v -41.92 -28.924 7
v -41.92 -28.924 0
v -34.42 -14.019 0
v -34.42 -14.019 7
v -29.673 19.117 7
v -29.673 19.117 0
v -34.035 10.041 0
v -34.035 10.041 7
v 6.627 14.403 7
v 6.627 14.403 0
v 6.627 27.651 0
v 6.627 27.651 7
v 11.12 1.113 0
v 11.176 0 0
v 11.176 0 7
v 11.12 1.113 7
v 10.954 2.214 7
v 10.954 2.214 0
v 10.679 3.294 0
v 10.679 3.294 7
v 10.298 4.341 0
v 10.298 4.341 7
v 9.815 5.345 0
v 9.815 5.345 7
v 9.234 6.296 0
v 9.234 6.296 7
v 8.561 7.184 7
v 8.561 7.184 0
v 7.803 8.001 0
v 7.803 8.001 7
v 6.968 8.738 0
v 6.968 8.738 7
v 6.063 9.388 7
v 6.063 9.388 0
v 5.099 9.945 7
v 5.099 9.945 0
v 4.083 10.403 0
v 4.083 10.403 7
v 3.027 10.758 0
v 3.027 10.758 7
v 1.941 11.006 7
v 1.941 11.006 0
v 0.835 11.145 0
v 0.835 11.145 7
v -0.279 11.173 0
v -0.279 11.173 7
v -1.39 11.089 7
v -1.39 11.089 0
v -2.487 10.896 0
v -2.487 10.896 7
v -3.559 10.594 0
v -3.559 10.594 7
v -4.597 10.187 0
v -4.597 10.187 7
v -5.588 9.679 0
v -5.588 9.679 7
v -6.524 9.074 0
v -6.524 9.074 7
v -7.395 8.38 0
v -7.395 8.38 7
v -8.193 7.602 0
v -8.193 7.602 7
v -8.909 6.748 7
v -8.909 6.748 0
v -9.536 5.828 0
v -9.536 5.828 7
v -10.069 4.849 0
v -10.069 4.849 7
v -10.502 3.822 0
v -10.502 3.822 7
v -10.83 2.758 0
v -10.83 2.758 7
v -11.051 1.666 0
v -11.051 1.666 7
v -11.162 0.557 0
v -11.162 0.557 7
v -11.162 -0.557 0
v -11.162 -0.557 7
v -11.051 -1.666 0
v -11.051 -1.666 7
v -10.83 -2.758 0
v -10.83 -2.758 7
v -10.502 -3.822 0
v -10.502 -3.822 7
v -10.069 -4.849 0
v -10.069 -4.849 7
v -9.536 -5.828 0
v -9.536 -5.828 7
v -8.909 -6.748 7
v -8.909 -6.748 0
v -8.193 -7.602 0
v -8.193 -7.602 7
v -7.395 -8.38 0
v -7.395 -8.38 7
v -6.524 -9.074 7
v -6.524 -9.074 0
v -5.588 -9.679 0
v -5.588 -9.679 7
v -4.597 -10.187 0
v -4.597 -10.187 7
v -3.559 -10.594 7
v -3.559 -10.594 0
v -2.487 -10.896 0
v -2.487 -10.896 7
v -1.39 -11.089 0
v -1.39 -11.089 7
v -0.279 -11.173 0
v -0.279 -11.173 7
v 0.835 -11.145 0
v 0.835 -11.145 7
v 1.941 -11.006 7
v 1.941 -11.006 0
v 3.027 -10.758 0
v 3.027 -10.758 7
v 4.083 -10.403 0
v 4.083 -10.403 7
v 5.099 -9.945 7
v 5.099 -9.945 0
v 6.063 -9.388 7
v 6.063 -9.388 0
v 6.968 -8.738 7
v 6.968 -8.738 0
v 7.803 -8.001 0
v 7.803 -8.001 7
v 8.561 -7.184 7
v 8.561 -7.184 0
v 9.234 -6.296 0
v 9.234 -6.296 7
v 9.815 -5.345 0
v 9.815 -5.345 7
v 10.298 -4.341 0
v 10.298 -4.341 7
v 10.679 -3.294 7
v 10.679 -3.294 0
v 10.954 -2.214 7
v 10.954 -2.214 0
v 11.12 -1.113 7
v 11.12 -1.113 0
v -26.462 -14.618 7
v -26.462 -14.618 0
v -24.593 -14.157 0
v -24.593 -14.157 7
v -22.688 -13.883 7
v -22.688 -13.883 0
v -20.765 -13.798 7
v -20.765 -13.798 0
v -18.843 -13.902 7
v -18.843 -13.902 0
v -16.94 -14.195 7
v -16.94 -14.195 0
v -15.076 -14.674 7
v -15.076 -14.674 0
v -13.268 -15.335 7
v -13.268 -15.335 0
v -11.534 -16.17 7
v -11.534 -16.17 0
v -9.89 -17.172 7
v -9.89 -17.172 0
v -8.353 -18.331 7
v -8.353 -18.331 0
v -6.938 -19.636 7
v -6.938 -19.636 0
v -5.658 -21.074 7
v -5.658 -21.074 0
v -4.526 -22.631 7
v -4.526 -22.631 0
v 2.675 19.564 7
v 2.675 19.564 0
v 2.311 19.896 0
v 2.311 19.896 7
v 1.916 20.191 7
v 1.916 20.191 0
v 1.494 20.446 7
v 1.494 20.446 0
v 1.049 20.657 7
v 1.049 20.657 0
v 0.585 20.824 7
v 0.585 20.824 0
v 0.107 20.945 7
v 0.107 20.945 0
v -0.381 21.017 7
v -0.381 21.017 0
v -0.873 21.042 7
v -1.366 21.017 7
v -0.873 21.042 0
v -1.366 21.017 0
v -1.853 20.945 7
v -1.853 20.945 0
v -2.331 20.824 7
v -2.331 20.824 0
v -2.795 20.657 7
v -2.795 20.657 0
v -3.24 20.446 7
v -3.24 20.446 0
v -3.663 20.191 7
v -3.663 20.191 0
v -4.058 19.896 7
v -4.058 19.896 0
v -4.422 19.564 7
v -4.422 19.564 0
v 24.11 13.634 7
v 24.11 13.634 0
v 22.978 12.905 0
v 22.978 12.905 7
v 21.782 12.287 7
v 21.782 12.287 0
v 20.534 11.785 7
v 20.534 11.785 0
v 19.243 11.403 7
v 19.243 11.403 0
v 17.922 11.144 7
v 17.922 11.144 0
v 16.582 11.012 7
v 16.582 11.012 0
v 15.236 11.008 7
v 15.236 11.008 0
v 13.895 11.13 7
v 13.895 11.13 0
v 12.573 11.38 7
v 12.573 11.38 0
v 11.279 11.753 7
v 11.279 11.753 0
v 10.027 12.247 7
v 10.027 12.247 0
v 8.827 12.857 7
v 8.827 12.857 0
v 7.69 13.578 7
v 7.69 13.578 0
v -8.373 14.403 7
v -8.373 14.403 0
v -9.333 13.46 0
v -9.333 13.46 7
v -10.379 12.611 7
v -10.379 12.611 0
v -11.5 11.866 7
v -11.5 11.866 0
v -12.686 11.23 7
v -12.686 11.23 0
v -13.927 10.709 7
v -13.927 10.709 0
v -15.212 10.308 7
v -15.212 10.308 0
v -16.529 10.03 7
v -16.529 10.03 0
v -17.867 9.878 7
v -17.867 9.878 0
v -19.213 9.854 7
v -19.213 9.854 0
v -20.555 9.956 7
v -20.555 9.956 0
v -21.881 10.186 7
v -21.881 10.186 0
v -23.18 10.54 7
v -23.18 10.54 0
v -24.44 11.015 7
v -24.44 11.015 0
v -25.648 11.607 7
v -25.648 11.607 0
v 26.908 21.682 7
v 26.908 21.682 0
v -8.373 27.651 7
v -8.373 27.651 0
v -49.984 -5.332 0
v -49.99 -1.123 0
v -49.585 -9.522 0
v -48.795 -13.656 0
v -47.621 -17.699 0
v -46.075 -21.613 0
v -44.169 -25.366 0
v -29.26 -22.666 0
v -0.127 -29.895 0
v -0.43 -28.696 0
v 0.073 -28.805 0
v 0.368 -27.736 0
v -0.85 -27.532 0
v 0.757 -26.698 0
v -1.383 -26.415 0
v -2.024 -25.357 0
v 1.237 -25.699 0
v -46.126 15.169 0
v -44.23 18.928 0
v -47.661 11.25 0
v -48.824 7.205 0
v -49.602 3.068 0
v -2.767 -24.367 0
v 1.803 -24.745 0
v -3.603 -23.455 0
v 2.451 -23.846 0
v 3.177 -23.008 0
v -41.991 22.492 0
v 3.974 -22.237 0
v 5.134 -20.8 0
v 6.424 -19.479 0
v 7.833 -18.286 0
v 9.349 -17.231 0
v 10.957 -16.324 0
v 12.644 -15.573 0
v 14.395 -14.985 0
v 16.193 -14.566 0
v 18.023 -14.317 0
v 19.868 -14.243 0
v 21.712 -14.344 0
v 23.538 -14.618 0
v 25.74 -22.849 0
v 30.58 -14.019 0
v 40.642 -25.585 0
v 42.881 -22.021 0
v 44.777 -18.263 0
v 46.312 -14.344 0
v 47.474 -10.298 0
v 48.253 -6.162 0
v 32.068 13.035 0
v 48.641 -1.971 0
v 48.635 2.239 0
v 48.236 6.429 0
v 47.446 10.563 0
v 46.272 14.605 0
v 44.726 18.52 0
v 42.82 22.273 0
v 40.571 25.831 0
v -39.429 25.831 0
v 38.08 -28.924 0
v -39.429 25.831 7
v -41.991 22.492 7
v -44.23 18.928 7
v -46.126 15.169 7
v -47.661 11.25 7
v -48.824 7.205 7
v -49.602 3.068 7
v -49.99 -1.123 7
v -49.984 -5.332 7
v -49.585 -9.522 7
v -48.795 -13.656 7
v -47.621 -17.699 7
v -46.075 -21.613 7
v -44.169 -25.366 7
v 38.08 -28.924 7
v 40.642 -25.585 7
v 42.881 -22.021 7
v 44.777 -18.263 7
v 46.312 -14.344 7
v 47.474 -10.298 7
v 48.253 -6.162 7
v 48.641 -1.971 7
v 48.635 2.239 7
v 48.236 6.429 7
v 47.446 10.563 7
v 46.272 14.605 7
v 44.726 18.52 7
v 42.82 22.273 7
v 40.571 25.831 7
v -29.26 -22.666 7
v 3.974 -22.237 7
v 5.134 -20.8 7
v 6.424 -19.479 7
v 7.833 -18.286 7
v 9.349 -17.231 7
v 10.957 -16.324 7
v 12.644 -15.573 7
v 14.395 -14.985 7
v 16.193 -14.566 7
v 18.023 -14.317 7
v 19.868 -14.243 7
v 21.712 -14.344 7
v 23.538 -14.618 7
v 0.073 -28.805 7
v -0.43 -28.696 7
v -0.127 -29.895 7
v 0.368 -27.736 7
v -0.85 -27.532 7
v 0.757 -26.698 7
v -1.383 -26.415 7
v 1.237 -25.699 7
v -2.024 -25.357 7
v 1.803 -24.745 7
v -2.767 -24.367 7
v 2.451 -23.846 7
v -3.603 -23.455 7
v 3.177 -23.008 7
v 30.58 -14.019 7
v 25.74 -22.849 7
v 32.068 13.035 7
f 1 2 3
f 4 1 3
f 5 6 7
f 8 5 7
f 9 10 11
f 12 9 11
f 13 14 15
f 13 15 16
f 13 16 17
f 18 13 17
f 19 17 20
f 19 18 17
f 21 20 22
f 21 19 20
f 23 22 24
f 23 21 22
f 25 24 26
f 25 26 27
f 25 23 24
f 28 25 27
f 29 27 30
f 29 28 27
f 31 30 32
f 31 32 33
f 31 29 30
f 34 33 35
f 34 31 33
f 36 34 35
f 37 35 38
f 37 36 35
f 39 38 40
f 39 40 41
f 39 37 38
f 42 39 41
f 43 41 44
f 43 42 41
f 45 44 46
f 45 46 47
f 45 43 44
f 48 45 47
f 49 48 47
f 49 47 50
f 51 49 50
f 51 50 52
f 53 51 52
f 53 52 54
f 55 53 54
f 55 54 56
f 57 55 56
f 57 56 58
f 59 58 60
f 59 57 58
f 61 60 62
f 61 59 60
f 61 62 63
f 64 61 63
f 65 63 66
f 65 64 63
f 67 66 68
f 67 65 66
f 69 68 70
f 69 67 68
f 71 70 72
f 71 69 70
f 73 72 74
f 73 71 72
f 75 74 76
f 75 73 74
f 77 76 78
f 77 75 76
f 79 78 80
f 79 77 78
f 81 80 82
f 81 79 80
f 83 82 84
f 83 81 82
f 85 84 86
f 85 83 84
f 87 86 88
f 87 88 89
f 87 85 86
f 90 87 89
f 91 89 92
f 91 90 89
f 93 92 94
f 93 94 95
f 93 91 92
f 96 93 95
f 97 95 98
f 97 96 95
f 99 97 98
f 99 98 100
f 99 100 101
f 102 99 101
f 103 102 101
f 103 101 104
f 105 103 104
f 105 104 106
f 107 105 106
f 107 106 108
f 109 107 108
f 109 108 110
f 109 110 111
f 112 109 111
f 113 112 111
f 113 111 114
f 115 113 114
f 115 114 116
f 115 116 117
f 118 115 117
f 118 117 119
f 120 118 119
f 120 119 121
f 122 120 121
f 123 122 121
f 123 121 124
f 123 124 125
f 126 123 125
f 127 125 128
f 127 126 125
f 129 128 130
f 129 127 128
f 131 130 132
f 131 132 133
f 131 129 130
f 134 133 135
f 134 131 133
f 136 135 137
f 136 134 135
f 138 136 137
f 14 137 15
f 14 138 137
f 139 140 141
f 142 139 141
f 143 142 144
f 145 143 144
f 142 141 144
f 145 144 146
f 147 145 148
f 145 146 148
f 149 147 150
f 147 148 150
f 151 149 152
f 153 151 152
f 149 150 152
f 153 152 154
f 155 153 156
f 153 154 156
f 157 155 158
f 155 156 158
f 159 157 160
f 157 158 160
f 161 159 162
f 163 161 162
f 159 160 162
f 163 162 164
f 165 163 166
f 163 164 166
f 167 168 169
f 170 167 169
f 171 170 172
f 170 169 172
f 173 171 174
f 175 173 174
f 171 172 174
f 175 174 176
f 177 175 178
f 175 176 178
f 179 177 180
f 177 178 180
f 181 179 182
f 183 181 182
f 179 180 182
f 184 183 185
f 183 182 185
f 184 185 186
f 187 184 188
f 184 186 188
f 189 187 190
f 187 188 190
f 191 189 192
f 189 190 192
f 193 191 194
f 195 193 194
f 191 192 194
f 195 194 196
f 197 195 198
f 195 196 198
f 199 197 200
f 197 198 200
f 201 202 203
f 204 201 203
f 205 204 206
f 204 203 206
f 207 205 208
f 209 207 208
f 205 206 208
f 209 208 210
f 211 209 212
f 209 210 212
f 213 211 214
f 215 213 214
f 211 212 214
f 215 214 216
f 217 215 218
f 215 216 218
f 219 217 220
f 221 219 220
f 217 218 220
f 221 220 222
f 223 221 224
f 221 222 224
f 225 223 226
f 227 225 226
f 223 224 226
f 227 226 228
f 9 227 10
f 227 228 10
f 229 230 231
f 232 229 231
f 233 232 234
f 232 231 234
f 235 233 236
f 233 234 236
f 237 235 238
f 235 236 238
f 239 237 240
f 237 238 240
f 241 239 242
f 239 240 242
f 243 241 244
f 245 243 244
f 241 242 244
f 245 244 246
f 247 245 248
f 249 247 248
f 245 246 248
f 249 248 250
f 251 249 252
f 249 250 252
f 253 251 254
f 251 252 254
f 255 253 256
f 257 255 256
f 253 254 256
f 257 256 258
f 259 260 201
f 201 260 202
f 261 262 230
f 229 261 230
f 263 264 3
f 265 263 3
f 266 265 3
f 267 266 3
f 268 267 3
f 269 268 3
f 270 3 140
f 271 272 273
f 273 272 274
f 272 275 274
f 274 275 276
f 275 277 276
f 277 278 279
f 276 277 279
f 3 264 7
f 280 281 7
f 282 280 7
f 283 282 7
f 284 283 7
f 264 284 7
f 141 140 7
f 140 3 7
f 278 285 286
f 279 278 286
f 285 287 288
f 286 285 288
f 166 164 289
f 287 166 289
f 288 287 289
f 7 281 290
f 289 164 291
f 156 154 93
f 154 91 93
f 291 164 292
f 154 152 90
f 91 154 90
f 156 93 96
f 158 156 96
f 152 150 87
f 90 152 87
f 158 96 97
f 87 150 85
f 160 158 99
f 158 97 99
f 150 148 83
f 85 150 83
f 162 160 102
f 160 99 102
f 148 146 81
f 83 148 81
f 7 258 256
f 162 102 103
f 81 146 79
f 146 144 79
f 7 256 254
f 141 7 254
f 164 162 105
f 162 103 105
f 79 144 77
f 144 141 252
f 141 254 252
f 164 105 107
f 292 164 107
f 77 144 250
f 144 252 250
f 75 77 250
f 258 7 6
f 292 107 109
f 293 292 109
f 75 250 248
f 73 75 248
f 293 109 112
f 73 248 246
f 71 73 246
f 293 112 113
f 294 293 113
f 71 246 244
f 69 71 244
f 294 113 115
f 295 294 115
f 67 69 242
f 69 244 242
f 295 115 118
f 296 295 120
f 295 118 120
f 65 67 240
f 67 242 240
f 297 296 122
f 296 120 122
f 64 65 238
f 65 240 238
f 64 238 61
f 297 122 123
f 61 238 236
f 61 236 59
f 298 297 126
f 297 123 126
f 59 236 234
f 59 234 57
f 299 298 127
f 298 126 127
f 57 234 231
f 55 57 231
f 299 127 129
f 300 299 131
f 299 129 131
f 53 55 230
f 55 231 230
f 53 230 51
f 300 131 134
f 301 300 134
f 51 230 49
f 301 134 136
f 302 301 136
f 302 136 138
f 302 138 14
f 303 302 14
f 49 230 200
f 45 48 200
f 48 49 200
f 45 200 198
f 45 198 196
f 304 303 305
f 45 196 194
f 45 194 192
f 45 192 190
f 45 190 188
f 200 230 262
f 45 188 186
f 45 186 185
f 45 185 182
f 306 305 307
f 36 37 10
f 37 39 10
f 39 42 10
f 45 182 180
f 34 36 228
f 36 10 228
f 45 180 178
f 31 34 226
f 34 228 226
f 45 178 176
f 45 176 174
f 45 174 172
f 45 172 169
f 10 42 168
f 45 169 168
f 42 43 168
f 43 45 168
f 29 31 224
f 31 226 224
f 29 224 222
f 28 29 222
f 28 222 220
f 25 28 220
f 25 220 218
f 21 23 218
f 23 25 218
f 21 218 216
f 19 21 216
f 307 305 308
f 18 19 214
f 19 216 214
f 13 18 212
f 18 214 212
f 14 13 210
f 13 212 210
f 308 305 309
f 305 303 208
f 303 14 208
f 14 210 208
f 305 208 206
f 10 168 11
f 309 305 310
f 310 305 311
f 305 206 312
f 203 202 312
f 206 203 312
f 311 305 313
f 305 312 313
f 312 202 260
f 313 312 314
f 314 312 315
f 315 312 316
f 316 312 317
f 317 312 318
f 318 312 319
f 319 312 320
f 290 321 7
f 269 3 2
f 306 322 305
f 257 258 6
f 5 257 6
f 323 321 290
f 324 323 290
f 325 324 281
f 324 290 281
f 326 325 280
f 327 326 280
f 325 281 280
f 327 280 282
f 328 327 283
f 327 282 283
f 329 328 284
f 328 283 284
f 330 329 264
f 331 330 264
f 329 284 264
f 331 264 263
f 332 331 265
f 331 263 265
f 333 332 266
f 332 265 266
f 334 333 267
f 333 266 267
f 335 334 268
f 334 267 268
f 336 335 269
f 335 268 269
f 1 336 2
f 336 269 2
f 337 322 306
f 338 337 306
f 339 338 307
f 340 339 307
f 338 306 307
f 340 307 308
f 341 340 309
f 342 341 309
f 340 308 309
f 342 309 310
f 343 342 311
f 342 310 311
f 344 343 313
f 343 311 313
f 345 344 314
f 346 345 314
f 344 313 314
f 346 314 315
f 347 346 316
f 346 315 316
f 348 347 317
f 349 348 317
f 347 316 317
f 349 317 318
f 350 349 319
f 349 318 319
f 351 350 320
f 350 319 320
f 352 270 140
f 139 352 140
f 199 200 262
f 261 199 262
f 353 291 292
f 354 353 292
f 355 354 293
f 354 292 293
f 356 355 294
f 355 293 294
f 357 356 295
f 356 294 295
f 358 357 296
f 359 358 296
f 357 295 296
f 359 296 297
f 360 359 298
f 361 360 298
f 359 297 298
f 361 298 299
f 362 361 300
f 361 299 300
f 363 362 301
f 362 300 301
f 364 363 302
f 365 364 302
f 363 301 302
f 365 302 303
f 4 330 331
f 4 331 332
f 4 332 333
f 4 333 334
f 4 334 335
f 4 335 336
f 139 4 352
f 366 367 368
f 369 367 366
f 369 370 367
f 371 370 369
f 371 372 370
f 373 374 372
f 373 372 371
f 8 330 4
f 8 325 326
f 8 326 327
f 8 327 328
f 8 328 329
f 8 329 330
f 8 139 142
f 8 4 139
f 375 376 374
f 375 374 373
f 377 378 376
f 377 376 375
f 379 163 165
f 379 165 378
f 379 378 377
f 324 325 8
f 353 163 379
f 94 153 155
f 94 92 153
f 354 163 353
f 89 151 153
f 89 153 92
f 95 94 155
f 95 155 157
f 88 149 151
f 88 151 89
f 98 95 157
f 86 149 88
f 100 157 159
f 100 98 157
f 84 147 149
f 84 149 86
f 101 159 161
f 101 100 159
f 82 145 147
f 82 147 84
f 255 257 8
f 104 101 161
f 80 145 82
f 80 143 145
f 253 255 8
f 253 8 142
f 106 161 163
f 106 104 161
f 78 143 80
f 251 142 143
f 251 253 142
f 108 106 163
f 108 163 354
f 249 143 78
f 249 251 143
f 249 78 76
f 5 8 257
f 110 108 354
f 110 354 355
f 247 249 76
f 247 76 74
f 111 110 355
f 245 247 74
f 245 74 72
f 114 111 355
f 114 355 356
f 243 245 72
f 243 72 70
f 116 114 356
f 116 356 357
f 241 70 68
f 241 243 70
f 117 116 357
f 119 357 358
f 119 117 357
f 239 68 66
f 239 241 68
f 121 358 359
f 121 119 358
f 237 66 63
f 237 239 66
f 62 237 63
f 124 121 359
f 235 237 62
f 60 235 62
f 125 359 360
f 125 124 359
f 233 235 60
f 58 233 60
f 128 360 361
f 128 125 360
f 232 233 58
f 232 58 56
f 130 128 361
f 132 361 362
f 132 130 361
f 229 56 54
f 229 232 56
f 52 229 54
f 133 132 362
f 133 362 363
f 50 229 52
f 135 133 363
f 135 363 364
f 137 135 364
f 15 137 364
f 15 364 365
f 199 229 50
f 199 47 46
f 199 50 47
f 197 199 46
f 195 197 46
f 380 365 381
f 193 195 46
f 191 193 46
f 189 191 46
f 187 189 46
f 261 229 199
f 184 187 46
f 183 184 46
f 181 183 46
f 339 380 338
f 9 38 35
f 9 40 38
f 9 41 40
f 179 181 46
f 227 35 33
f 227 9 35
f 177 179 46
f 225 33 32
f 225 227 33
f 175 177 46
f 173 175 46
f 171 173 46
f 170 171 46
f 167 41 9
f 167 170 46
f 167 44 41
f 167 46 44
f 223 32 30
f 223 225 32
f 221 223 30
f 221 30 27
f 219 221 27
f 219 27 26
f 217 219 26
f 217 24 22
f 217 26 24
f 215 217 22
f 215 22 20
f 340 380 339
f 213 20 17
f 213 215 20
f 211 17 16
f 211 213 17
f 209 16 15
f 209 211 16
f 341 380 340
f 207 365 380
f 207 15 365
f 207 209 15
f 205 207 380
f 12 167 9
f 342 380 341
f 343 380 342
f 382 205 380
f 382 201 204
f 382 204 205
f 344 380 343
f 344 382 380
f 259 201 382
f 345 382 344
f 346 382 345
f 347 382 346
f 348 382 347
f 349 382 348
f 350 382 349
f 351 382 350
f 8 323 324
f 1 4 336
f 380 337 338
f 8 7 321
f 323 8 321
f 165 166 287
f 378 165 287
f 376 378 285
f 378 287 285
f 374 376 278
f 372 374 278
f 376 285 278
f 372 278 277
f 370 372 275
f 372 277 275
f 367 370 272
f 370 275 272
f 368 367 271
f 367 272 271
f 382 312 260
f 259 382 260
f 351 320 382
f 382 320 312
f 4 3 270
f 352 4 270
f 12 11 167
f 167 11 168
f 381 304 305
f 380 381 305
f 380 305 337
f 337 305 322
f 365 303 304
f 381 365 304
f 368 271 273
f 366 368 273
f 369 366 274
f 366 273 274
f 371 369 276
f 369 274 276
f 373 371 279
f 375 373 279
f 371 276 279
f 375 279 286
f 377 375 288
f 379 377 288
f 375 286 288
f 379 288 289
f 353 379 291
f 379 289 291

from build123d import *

# Parameters (mm, degrees)
F0_R     = 12.7
F0_R_2   = 11.176
F1_DEPTH = 7


with BuildPart() as f1:
    # F0 (on Top) → F1 (new body)
    with BuildSketch(Plane.XY):
        with BuildLine():
            Line((-34.0347428799, 10.0407234107), (-39.4287826318, 25.8310334972))
            ThreePointArc((-39.4287826318, 25.8310334972), (-49.9900963881, -1.1227458082), (-41.9203568823, -28.9243081997))
            Line((-41.9203568823, -28.9243081997), (-34.420360506, -14.0186176143))
            Line((-34.420360506, -14.0186176143), (-29.2602696984, -22.6658631364))
            Line((-29.2602696984, -22.6658631364), (-26.4620529027, -14.6181120741))
            ThreePointArc((-26.4620529027, -14.6181120741), (-14.1637665374, -14.9822916534), (-4.52611316, -22.6305667311))
            ThreePointArc((-4.52611316, -22.6305667311), (-1.6908403761, -25.8780046014), (-0.1272074495, -29.8954262311))
            ThreePointArc((-0.1272074495, -29.8954262311), (1.2367097468, -25.698504913), (3.97388684, -22.2369618714))
            ThreePointArc((3.97388684, -22.2369618714), (12.644433264, -15.5734140078), (23.5379470973, -14.6181120741))
            Line((23.5379470973, -14.6181120741), (25.7397303016, -22.8490576527))
            Line((25.7397303016, -22.8490576527), (30.579639494, -14.0186176143))
            Line((30.579639494, -14.0186176143), (38.0796431177, -28.924304553))
            ThreePointArc((38.0796431177, -28.924304553), (48.640956874, -1.9705252477), (40.5712173682, 25.8310371438))
            Line((40.5712173682, 25.8310371438), (32.0682425965, 13.0346596218))
            Line((32.0682425965, 13.0346596218), (26.9081517889, 21.6819051439))
            Line((26.9081517889, 21.6819051439), (24.1099349931, 13.6341540816))
            ThreePointArc((24.1099349931, 13.6341540816), (15.2359931939, 11.0077124587), (6.626828122, 14.4029025006))
            Line((6.626828122, 14.4029025006), (6.626828122, 27.6512976753))
            Line((6.626828122, 27.6512976753), (2.6754510519, 19.5639701469))
            ThreePointArc((2.6754510519, 19.5639701469), (-0.873171878, 21.0415739028), (-4.421794808, 19.5639701469))
            Line((-4.421794808, 19.5639701469), (-8.373171878, 27.6512976753))
            Line((-8.373171878, 27.6512976753), (-8.373171878, 14.4029025006))
            ThreePointArc((-8.373171878, 14.4029025006), (-16.5293148782, 10.0299892821), (-25.6484009718, 11.6071092754))
            Line((-25.6484009718, 11.6071092754), (-29.673149547, 19.1169503724))
            Line((-29.673149547, 19.1169503724), (-34.0347428799, 10.0407234107))
        make_face()
        Circle(F0_R, mode=Mode.SUBTRACT)
        Circle(F0_R)
        Circle(F0_R_2, mode=Mode.SUBTRACT)
    extrude(amount=F1_DEPTH)


solid = f1.part
